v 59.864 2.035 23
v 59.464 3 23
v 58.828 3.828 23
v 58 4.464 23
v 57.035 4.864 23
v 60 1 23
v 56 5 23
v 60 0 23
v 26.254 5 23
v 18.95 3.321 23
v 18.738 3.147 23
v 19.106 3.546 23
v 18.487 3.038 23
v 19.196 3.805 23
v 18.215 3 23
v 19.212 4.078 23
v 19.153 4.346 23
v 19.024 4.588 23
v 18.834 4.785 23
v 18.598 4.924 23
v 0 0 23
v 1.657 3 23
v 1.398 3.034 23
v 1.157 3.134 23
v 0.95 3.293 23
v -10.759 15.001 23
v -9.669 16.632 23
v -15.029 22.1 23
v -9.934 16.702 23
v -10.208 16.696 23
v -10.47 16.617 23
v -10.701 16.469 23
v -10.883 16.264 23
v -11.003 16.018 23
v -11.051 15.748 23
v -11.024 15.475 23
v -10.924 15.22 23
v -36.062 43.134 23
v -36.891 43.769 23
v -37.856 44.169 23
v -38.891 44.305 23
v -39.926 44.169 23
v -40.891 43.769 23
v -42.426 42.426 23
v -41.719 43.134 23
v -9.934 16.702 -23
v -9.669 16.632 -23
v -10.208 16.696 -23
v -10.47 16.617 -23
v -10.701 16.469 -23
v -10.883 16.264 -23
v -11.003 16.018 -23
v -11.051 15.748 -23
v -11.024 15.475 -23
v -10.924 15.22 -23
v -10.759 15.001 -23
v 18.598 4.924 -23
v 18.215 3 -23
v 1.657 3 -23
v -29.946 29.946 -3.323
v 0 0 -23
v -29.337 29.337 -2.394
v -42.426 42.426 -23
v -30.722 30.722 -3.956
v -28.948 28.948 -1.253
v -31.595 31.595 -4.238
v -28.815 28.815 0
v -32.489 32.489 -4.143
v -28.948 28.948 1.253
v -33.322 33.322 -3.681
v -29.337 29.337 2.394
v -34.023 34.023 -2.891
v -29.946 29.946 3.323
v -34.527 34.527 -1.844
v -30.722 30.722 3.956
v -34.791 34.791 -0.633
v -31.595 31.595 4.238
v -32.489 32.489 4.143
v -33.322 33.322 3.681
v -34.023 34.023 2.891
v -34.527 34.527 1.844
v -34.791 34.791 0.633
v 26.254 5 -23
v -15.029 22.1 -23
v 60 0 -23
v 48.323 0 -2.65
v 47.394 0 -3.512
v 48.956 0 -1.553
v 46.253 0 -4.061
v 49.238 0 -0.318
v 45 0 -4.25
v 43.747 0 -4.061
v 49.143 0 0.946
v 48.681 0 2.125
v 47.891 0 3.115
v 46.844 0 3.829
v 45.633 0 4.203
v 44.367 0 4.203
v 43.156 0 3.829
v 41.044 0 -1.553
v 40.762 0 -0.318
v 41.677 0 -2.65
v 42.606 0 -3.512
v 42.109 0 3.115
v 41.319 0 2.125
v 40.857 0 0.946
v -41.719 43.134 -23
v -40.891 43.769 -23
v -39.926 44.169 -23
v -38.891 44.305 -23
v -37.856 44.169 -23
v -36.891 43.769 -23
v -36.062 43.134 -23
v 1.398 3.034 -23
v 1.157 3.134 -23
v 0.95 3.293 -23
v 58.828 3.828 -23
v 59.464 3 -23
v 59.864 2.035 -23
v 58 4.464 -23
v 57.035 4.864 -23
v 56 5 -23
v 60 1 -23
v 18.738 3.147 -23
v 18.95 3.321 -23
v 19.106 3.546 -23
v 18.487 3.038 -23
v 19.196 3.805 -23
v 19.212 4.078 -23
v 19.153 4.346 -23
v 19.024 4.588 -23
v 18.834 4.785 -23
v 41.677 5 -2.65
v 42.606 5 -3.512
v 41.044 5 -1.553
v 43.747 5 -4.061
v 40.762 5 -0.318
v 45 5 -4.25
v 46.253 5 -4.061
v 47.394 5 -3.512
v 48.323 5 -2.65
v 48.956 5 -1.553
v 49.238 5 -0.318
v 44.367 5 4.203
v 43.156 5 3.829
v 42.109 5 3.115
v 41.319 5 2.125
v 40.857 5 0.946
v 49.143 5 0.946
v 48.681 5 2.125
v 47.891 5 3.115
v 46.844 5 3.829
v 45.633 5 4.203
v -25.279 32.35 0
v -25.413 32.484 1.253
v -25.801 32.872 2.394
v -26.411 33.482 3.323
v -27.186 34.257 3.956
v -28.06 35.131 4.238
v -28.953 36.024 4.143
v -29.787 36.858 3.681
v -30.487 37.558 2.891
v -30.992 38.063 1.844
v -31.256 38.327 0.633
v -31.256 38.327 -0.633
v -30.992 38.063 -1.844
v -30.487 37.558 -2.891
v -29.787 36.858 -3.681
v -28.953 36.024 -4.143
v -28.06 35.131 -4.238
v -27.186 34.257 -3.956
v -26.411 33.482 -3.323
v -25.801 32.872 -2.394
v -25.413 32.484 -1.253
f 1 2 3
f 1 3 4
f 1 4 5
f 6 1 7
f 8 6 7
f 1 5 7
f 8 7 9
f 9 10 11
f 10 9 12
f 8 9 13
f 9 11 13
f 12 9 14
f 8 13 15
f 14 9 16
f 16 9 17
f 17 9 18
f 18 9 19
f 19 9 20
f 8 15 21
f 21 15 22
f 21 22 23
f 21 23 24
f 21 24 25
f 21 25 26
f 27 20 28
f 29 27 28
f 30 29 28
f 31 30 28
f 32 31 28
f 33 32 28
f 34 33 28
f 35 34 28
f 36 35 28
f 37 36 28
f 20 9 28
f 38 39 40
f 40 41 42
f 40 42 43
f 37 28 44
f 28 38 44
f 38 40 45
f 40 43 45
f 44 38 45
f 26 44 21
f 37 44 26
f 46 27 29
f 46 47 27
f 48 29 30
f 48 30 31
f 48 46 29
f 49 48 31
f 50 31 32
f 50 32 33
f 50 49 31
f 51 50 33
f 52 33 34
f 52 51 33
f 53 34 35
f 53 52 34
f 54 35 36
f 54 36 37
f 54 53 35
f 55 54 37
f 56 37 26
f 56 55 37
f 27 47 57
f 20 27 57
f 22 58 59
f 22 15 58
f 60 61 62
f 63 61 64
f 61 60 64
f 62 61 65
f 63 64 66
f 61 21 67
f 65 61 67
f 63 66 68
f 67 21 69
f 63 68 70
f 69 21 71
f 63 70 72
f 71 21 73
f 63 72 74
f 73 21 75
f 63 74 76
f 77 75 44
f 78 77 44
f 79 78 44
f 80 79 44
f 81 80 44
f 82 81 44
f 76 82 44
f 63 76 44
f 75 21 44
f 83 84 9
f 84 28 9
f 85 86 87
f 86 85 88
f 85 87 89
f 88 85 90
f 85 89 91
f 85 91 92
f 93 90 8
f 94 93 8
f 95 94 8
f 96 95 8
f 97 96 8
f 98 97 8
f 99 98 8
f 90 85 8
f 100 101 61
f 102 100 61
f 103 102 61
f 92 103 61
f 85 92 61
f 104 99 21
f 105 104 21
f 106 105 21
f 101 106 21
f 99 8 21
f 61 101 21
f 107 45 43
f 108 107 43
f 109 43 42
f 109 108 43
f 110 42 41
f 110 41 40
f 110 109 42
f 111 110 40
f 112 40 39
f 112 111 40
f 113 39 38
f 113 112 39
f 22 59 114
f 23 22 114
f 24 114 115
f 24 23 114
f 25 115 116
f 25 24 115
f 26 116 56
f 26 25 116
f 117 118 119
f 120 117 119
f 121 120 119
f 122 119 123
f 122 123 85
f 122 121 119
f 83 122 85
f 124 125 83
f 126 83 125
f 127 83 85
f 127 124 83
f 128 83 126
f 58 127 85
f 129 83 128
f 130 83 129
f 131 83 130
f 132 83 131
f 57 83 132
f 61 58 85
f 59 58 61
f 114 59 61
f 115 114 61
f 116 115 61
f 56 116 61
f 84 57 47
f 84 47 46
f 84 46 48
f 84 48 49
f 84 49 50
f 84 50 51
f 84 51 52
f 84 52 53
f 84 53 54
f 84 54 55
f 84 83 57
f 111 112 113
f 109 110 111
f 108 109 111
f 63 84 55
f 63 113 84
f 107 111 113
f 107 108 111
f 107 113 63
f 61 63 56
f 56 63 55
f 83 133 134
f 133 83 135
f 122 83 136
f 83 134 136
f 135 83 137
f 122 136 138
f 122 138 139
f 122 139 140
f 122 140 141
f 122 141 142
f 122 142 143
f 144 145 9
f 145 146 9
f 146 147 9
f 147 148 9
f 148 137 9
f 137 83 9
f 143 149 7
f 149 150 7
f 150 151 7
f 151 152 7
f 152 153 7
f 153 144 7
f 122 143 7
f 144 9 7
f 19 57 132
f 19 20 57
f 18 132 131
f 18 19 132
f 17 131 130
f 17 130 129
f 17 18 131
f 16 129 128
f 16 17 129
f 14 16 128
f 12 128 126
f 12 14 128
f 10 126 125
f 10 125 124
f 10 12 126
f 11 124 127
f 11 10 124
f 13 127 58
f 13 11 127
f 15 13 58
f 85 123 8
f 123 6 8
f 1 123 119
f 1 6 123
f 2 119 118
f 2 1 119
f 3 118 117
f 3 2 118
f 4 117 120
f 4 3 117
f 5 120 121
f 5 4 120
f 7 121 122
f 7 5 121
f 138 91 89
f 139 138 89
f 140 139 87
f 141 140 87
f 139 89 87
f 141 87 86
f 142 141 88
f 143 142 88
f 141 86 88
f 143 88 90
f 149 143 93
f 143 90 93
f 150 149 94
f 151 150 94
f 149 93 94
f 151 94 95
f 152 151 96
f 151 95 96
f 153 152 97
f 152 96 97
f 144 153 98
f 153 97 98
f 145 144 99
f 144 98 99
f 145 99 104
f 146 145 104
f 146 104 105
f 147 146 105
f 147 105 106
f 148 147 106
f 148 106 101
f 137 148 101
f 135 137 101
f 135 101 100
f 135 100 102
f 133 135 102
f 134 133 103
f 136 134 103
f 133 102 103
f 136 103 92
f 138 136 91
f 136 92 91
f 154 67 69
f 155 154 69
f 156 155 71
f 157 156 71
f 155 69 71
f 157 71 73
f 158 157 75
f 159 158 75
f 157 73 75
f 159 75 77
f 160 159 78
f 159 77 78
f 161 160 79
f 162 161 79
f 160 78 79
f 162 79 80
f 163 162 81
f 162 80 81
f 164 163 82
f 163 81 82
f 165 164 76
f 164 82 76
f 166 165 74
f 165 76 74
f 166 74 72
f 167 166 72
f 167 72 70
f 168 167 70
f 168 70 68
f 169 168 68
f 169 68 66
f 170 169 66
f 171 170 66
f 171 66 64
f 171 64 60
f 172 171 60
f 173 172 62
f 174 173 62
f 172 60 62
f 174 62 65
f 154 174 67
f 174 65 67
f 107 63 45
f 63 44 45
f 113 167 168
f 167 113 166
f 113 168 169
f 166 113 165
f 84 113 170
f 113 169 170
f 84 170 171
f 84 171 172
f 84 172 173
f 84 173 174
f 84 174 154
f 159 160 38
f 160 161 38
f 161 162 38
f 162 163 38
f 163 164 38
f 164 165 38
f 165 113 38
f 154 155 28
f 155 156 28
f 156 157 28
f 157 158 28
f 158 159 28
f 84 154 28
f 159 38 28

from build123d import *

# Parameters (mm, degrees)
EXTRUDE_1_DEPTH     = 23
SKETCH_2_R          = 4.25
CUT_EXTRUDE_1_DEPTH = 5
SKETCH_3_R          = 4.25
CUT_EXTRUDE_2_DEPTH = 5
FILLET_1_R          = 4
FILLET_2_R          = 1


with BuildPart() as part:
    # Эскиз1 → Бобышка-Вытянуть1 (new body, symmetric)
    with BuildSketch(Plane.XY):
        Polygon((0, 0), (-42.426406871, 42.426406871), (-38.890872965, 45.961940777), (-15.028558569, 22.099626381), (26.253591352, 5), (60, 5), (60, 0), align=None)
        Polygon((-14.313708499, 18.556349186), (23.242640687, 3), (1.242640687, 3), align=None, mode=Mode.SUBTRACT)
    extrude(amount=EXTRUDE_1_DEPTH, both=True)

    # Эскиз2 → Вырез-Вытянуть1 (cut)
    with BuildSketch(Plane(origin=(0, 0, 0), x_dir=(0, 0, 1), z_dir=(-0.707106781, -0.707106781, 0))):
        with Locations(Location((0, 45, 0), (0, 0, 270))):  # turned: the seam where the file's is
            Circle(SKETCH_2_R)
    extrude(amount=-CUT_EXTRUDE_1_DEPTH, mode=Mode.SUBTRACT)

    # Эскиз3 → Вырез-Вытянуть2 (cut)
    with BuildSketch(Plane.XZ):
        with Locations(Location((45, 0, 0), (0, 0, 270))):  # turned: the seam where the file's is
            Circle(SKETCH_3_R)
    extrude(amount=-CUT_EXTRUDE_2_DEPTH, mode=Mode.SUBTRACT)

    # Скругление1
    fillet_1_edges = [part.edges().sort_by_distance(p)[0] for p in [
        (-38.890872965, 45.961940777, 0),
        (60, 5, 0),
    ]]
    fillet(fillet_1_edges, radius=FILLET_1_R)

    # Скругление2
    fillet_2_edges = [part.edges().sort_by_distance(p)[0] for p in [
        (-14.313708499, 18.556349186, 0),
        (1.242640687, 3, 0),
        (23.242640687, 3, 0),
    ]]
    fillet(fillet_2_edges, radius=FILLET_2_R)


solid = part.part
